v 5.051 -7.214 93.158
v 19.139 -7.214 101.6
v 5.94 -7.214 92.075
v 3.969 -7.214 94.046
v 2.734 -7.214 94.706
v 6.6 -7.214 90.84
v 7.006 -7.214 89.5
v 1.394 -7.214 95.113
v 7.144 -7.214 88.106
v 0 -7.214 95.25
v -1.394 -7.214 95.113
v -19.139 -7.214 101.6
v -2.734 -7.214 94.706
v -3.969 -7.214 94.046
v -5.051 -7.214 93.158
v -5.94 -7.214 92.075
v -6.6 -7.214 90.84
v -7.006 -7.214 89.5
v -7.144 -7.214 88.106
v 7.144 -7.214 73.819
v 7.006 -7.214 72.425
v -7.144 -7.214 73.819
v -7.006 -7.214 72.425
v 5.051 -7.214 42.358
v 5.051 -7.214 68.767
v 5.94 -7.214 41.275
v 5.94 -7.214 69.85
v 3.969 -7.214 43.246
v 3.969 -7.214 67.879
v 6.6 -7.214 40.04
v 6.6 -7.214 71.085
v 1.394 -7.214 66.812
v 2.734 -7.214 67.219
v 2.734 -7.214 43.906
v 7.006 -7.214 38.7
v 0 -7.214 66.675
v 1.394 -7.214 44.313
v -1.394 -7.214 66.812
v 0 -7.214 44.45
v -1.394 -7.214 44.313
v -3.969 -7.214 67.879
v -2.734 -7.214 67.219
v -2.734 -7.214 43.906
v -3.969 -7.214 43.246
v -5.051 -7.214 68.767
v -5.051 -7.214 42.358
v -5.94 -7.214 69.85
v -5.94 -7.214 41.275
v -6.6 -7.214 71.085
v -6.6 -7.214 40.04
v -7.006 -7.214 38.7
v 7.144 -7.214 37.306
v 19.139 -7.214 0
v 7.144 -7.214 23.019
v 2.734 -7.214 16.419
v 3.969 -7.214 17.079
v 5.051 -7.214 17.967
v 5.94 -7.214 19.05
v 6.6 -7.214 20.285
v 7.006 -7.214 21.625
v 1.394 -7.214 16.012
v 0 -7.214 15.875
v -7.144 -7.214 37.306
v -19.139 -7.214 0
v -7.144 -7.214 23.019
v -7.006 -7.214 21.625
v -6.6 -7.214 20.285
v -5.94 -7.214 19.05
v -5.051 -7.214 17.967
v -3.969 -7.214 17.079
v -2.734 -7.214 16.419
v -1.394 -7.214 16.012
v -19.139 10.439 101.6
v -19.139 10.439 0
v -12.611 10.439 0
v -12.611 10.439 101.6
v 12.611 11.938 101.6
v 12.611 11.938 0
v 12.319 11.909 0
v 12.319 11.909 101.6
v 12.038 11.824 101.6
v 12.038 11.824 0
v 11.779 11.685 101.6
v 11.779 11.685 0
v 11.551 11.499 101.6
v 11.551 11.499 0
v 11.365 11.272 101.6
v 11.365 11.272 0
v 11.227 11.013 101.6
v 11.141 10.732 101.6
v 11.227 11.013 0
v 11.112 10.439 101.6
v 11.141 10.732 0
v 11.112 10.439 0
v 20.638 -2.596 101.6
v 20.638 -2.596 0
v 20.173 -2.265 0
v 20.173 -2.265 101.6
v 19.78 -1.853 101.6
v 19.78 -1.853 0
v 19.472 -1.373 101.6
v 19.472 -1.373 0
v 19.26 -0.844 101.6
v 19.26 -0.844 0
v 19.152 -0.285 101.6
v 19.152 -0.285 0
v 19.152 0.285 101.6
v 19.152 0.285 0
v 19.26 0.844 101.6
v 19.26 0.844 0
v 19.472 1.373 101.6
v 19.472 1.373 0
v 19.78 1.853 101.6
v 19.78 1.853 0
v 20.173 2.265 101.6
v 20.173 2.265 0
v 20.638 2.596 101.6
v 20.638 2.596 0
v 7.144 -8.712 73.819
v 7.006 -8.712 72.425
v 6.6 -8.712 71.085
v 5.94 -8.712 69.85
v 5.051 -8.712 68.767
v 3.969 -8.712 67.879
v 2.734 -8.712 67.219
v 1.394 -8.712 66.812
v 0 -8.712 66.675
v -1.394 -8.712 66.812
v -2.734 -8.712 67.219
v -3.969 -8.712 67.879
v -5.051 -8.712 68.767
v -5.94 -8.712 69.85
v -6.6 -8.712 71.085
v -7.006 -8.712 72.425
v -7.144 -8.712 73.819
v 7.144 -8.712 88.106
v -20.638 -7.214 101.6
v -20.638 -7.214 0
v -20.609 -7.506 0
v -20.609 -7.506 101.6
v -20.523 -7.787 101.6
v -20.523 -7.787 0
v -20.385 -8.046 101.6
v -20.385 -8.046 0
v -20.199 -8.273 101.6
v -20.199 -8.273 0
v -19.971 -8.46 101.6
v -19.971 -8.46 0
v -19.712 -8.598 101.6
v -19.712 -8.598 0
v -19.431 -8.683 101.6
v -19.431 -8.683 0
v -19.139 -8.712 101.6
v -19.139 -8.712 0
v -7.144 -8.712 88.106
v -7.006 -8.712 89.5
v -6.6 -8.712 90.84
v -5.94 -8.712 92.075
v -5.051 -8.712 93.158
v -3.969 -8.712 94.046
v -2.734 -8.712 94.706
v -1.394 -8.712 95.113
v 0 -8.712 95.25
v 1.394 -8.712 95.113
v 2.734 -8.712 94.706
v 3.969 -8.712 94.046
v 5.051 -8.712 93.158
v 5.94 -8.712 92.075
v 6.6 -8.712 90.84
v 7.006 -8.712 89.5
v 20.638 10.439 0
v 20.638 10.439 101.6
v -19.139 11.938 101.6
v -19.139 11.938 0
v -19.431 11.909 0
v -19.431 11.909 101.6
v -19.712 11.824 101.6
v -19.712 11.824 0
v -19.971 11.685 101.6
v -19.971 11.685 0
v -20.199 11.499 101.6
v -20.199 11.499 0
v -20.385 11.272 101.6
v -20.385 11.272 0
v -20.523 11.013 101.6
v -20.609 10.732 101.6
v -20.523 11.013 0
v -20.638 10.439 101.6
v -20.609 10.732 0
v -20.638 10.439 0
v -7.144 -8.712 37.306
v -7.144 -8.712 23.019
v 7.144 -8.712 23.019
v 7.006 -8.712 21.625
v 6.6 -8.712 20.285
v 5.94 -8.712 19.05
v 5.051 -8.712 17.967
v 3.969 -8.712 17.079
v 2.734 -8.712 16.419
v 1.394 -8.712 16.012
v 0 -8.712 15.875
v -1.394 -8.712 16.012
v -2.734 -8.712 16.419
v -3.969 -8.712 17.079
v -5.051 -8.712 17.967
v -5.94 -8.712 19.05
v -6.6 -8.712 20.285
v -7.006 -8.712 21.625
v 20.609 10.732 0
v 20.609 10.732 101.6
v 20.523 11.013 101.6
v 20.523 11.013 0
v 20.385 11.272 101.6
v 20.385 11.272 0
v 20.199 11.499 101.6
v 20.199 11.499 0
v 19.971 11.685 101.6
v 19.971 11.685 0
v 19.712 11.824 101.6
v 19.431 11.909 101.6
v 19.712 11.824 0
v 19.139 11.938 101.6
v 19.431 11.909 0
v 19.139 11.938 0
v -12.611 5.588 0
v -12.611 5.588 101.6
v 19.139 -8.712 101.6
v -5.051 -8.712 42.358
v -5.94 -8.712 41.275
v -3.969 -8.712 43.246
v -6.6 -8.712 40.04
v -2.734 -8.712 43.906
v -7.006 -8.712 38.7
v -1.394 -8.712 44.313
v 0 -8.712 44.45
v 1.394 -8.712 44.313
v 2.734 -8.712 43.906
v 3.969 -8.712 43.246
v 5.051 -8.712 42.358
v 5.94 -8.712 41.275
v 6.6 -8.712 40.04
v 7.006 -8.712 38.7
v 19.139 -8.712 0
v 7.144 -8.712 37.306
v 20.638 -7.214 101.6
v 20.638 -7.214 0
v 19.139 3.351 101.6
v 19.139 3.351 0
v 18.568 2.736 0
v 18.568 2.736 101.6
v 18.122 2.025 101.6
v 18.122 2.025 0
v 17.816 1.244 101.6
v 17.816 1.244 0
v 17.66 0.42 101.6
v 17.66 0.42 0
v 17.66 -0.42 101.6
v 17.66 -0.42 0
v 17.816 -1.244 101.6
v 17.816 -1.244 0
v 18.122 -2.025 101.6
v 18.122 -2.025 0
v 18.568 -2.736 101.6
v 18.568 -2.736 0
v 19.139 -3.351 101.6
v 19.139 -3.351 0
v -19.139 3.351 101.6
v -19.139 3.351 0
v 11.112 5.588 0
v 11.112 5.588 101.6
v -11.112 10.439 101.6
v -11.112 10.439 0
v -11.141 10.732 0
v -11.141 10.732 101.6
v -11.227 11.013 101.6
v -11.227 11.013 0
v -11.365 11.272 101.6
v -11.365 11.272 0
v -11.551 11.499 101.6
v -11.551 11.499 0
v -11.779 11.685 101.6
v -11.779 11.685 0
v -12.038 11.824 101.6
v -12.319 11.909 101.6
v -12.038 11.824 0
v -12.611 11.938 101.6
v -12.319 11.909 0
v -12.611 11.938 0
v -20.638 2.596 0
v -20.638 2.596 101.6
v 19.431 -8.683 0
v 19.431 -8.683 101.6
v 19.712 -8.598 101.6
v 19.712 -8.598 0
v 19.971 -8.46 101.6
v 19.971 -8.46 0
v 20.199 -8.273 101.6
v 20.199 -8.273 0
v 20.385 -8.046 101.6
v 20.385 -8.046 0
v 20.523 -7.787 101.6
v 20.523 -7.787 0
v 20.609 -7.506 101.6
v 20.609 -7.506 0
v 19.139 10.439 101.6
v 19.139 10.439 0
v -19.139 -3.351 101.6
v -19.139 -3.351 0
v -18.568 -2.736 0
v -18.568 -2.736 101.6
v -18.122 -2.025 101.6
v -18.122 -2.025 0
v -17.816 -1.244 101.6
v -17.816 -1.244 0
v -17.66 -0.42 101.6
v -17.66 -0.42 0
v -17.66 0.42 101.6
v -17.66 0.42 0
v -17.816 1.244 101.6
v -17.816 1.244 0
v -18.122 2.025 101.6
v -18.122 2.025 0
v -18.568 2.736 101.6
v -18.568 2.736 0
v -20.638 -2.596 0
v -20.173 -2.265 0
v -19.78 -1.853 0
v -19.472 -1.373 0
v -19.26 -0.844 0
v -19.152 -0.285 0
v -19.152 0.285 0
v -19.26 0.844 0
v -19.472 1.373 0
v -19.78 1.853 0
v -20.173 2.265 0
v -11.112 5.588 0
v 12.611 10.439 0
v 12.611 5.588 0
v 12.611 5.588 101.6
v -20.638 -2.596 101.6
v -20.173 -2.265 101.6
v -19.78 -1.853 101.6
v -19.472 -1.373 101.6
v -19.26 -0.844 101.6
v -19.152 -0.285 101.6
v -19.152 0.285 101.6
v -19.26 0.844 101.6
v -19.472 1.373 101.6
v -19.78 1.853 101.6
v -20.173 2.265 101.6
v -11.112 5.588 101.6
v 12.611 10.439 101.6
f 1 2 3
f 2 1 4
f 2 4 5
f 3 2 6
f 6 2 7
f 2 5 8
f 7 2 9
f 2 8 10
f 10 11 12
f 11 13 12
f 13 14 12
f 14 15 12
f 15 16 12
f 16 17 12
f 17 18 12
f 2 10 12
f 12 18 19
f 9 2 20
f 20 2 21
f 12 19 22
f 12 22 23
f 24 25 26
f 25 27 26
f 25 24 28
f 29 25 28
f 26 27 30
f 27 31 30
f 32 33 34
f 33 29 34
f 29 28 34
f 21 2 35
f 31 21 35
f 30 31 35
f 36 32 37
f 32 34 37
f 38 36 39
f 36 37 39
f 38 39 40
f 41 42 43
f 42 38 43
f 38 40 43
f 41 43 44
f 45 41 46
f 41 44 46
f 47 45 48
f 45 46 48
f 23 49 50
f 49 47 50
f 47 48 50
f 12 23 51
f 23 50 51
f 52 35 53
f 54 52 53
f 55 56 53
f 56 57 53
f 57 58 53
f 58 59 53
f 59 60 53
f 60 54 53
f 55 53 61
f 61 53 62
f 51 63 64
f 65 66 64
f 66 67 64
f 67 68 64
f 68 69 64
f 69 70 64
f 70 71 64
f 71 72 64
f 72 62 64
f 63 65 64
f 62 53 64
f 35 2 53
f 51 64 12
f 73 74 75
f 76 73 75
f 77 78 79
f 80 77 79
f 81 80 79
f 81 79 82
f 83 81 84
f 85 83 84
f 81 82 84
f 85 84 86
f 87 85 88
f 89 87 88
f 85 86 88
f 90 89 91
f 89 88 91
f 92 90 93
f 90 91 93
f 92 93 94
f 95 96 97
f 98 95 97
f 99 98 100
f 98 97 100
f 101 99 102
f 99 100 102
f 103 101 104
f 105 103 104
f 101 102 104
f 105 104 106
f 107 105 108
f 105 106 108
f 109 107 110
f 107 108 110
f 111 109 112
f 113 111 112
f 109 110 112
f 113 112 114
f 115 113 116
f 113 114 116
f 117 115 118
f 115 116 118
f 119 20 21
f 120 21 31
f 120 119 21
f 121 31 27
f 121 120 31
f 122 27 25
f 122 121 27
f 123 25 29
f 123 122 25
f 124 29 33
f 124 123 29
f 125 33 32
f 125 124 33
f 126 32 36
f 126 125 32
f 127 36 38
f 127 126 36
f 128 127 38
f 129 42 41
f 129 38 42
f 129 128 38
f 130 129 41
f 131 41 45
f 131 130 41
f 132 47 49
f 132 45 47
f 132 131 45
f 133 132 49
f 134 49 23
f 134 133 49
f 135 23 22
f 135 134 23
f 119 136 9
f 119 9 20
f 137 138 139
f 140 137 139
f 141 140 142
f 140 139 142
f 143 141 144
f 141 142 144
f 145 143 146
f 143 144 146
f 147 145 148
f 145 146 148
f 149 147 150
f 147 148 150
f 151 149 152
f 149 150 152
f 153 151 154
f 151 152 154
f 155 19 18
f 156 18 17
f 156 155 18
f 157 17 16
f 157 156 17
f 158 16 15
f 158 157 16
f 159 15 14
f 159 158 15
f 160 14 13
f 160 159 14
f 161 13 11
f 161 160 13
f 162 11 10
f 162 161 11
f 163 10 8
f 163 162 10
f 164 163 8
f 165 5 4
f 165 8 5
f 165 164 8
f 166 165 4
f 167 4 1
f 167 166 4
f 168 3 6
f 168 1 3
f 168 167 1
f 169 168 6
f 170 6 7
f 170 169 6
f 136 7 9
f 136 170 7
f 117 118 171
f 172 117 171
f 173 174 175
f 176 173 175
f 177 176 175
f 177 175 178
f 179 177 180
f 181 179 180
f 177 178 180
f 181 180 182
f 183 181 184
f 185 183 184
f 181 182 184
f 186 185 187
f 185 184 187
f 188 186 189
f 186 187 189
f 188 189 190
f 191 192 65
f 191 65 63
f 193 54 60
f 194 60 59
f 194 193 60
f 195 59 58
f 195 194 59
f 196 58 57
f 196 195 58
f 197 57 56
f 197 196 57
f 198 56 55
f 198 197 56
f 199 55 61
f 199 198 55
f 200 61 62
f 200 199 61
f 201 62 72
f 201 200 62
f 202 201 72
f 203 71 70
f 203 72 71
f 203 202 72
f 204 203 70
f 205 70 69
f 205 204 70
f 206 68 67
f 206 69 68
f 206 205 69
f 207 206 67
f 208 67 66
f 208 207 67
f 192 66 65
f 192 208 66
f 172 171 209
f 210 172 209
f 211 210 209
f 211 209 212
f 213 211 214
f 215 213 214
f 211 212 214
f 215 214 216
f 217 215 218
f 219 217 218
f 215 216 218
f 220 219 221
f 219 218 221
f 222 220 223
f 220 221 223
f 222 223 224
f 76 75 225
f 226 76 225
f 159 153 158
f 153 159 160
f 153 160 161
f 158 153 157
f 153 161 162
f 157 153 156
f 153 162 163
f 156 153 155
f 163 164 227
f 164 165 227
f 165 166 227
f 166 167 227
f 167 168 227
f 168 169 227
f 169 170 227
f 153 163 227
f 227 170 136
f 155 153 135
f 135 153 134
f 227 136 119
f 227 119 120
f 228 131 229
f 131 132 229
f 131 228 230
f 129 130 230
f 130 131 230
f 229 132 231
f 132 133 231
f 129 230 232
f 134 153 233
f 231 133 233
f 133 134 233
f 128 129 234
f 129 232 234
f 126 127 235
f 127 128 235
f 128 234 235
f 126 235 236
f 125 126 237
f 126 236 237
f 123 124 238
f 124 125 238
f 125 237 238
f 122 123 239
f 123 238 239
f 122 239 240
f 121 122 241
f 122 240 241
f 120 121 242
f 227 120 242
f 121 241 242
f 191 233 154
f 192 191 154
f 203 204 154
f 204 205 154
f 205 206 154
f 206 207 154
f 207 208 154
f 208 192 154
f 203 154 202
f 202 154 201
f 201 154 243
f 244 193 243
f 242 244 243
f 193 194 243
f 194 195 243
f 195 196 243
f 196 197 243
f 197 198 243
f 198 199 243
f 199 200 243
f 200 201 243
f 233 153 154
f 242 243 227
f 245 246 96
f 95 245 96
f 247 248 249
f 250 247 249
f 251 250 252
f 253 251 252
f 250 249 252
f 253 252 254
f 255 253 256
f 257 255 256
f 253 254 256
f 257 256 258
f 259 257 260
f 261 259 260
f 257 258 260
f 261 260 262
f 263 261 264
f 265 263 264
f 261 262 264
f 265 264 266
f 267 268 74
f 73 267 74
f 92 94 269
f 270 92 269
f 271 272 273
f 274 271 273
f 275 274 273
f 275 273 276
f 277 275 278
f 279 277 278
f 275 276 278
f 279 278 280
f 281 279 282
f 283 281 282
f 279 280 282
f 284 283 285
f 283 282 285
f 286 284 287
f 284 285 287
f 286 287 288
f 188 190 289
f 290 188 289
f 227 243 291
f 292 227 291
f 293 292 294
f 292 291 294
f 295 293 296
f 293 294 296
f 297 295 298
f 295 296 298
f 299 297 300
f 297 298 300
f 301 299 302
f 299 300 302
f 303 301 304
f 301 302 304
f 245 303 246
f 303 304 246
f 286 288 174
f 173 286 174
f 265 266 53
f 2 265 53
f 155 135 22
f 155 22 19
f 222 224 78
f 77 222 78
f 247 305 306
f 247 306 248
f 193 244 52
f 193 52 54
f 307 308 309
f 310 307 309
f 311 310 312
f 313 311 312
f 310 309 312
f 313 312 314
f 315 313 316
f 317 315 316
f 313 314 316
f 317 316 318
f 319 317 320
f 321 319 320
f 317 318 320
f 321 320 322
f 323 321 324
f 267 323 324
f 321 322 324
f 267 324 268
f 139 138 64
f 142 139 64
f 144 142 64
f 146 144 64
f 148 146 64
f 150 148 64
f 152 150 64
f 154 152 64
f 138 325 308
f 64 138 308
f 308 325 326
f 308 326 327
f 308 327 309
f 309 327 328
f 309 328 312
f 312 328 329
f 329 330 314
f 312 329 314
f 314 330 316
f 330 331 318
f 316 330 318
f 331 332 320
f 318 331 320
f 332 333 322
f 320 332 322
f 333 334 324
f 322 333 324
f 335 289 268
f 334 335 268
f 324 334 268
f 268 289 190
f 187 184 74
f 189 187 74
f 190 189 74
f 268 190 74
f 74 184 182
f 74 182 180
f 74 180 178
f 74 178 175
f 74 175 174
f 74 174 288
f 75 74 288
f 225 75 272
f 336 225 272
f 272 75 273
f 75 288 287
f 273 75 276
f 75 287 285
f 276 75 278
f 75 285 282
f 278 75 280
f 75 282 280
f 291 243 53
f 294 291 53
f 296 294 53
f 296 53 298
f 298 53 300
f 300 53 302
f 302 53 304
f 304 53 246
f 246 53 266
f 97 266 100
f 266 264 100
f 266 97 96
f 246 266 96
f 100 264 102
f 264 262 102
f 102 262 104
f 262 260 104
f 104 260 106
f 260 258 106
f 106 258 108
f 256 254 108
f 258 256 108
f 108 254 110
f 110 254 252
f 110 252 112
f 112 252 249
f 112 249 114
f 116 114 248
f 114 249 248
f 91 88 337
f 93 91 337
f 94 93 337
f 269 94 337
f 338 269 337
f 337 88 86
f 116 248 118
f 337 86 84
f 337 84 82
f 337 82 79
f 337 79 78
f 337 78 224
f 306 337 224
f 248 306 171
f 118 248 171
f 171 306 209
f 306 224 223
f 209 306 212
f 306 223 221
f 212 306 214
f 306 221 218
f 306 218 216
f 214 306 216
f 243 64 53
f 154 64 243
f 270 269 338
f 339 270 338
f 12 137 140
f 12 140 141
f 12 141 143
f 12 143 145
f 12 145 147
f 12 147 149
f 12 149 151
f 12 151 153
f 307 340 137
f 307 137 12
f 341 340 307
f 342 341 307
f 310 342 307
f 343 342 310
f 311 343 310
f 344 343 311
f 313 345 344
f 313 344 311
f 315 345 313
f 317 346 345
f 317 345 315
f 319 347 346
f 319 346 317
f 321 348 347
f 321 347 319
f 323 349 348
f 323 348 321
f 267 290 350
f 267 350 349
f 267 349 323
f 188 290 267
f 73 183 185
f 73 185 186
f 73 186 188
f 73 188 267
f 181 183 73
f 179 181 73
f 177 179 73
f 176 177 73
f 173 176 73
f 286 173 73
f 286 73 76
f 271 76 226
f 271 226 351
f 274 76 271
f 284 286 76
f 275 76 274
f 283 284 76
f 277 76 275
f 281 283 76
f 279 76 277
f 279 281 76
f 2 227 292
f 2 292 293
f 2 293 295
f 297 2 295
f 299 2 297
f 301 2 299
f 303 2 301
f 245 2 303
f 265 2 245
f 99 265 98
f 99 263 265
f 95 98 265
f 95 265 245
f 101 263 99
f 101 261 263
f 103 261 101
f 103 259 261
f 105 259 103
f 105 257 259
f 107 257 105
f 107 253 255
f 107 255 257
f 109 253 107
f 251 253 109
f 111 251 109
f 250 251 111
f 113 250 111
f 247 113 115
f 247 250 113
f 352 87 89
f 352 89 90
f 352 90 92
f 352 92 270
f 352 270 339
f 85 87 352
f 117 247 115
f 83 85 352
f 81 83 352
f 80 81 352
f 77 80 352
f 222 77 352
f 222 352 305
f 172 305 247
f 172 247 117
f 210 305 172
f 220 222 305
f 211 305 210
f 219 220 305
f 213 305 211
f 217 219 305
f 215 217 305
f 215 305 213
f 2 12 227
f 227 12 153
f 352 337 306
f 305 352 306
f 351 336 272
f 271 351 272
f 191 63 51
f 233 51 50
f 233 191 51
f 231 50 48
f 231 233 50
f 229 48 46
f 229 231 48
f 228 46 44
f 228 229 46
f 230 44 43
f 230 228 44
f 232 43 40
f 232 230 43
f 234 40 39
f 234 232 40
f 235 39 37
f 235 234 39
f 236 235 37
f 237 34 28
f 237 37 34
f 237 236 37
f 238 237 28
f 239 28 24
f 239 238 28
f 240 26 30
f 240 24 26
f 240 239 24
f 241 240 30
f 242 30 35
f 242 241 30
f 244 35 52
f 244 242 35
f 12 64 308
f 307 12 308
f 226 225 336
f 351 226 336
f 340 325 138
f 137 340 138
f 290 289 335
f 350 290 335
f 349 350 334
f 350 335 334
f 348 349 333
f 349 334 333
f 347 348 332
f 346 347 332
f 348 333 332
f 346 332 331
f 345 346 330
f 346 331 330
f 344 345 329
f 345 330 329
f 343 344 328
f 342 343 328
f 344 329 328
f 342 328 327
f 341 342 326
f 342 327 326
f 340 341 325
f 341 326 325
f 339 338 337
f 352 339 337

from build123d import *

# Parameters (mm, degrees)
BASE_EXTRUDE_DEPTH = 101.6
SLOT_DEPTH         = 118.113754477
LPATTERN1_COUNT    = 2
LPATTERN1_PITCH    = 50.8


with BuildPart() as part:
    # Sketch1 → Base-Extrude (new body)
    with BuildSketch(Plane.XY):
        with BuildLine():
            Line((-20.6375, 10.4394), (-20.6375, 2.59565134))
            ThreePointArc((-20.6375, 2.59565134), (-19.1389, 0), (-20.6375, -2.59565134))
            Line((-20.6375, -2.59565134), (-20.6375, -7.2136))
            ThreePointArc((-20.6375, -7.2136), (-20.198570222, -8.273270222), (-19.1389, -8.7122))
            Line((-19.1389, -8.7122), (19.1389, -8.7122))
            ThreePointArc((19.1389, -8.7122), (20.198570222, -8.273270222), (20.6375, -7.2136))
            Line((20.6375, -7.2136), (20.6375, -2.59565134))
            ThreePointArc((20.6375, -2.59565134), (19.1389, 0), (20.6375, 2.59565134))
            Line((20.6375, 2.59565134), (20.6375, 10.4394))
            ThreePointArc((20.6375, 10.4394), (20.198570222, 11.499070222), (19.1389, 11.938))
            Line((19.1389, 11.938), (12.6111, 11.938))
            ThreePointArc((12.6111, 11.938), (11.551429778, 11.499070222), (11.1125, 10.4394))
            Line((11.1125, 10.4394), (11.1125, 5.588))
            Line((11.1125, 5.588), (12.6111, 5.588))
            Line((12.6111, 5.588), (12.6111, 10.4394))
            Line((12.6111, 10.4394), (19.1389, 10.4394))
            Line((19.1389, 10.4394), (19.1389, 3.350971471))
            ThreePointArc((19.1389, 3.350971471), (17.6403, 0), (19.1389, -3.350971471))
            Line((19.1389, -3.350971471), (19.1389, -7.2136))
            Line((19.1389, -7.2136), (-19.1389, -7.2136))
            Line((-19.1389, -7.2136), (-19.1389, -3.350971471))
            ThreePointArc((-19.1389, -3.350971471), (-17.6403, 0), (-19.1389, 3.350971471))
            Line((-19.1389, 3.350971471), (-19.1389, 10.4394))
            Line((-19.1389, 10.4394), (-12.6111, 10.4394))
            Line((-12.6111, 10.4394), (-12.6111, 5.588))
            Line((-12.6111, 5.588), (-11.1125, 5.588))
            Line((-11.1125, 5.588), (-11.1125, 10.4394))
            ThreePointArc((-11.1125, 10.4394), (-11.551429778, 11.499070222), (-12.6111, 11.938))
            Line((-12.6111, 11.938), (-19.1389, 11.938))
            ThreePointArc((-19.1389, 11.938), (-20.198570222, 11.499070222), (-20.6375, 10.4394))
        make_face()
    extrude(amount=BASE_EXTRUDE_DEPTH)

    # Sketch2 → Slot (cut, through all)
    with BuildSketch(Plane(origin=(-0.747608536, -8.7122, -11.677878955), x_dir=(1, 0, 0), z_dir=(0, -1, 0))):
        with BuildLine():
            Line((7.891358536, 48.984128955), (7.891358536, 34.696628955))
            ThreePointArc((7.891358536, 34.696628955), (0.747608536, 27.552878955), (-6.396141464, 34.696628955))
            Line((-6.396141464, 34.696628955), (-6.396141464, 48.984128955))
            ThreePointArc((-6.396141464, 48.984128955), (0.747608536, 56.127878955), (7.891358536, 48.984128955))
        make_face()
    slot = extrude(amount=-SLOT_DEPTH, mode=Mode.SUBTRACT)

    # LPattern1: Slot ×2
    with Locations(*[(0, 0, i * LPATTERN1_PITCH) for i in range(1, LPATTERN1_COUNT)]):
        add(slot, mode=Mode.SUBTRACT)


solid = part.part
